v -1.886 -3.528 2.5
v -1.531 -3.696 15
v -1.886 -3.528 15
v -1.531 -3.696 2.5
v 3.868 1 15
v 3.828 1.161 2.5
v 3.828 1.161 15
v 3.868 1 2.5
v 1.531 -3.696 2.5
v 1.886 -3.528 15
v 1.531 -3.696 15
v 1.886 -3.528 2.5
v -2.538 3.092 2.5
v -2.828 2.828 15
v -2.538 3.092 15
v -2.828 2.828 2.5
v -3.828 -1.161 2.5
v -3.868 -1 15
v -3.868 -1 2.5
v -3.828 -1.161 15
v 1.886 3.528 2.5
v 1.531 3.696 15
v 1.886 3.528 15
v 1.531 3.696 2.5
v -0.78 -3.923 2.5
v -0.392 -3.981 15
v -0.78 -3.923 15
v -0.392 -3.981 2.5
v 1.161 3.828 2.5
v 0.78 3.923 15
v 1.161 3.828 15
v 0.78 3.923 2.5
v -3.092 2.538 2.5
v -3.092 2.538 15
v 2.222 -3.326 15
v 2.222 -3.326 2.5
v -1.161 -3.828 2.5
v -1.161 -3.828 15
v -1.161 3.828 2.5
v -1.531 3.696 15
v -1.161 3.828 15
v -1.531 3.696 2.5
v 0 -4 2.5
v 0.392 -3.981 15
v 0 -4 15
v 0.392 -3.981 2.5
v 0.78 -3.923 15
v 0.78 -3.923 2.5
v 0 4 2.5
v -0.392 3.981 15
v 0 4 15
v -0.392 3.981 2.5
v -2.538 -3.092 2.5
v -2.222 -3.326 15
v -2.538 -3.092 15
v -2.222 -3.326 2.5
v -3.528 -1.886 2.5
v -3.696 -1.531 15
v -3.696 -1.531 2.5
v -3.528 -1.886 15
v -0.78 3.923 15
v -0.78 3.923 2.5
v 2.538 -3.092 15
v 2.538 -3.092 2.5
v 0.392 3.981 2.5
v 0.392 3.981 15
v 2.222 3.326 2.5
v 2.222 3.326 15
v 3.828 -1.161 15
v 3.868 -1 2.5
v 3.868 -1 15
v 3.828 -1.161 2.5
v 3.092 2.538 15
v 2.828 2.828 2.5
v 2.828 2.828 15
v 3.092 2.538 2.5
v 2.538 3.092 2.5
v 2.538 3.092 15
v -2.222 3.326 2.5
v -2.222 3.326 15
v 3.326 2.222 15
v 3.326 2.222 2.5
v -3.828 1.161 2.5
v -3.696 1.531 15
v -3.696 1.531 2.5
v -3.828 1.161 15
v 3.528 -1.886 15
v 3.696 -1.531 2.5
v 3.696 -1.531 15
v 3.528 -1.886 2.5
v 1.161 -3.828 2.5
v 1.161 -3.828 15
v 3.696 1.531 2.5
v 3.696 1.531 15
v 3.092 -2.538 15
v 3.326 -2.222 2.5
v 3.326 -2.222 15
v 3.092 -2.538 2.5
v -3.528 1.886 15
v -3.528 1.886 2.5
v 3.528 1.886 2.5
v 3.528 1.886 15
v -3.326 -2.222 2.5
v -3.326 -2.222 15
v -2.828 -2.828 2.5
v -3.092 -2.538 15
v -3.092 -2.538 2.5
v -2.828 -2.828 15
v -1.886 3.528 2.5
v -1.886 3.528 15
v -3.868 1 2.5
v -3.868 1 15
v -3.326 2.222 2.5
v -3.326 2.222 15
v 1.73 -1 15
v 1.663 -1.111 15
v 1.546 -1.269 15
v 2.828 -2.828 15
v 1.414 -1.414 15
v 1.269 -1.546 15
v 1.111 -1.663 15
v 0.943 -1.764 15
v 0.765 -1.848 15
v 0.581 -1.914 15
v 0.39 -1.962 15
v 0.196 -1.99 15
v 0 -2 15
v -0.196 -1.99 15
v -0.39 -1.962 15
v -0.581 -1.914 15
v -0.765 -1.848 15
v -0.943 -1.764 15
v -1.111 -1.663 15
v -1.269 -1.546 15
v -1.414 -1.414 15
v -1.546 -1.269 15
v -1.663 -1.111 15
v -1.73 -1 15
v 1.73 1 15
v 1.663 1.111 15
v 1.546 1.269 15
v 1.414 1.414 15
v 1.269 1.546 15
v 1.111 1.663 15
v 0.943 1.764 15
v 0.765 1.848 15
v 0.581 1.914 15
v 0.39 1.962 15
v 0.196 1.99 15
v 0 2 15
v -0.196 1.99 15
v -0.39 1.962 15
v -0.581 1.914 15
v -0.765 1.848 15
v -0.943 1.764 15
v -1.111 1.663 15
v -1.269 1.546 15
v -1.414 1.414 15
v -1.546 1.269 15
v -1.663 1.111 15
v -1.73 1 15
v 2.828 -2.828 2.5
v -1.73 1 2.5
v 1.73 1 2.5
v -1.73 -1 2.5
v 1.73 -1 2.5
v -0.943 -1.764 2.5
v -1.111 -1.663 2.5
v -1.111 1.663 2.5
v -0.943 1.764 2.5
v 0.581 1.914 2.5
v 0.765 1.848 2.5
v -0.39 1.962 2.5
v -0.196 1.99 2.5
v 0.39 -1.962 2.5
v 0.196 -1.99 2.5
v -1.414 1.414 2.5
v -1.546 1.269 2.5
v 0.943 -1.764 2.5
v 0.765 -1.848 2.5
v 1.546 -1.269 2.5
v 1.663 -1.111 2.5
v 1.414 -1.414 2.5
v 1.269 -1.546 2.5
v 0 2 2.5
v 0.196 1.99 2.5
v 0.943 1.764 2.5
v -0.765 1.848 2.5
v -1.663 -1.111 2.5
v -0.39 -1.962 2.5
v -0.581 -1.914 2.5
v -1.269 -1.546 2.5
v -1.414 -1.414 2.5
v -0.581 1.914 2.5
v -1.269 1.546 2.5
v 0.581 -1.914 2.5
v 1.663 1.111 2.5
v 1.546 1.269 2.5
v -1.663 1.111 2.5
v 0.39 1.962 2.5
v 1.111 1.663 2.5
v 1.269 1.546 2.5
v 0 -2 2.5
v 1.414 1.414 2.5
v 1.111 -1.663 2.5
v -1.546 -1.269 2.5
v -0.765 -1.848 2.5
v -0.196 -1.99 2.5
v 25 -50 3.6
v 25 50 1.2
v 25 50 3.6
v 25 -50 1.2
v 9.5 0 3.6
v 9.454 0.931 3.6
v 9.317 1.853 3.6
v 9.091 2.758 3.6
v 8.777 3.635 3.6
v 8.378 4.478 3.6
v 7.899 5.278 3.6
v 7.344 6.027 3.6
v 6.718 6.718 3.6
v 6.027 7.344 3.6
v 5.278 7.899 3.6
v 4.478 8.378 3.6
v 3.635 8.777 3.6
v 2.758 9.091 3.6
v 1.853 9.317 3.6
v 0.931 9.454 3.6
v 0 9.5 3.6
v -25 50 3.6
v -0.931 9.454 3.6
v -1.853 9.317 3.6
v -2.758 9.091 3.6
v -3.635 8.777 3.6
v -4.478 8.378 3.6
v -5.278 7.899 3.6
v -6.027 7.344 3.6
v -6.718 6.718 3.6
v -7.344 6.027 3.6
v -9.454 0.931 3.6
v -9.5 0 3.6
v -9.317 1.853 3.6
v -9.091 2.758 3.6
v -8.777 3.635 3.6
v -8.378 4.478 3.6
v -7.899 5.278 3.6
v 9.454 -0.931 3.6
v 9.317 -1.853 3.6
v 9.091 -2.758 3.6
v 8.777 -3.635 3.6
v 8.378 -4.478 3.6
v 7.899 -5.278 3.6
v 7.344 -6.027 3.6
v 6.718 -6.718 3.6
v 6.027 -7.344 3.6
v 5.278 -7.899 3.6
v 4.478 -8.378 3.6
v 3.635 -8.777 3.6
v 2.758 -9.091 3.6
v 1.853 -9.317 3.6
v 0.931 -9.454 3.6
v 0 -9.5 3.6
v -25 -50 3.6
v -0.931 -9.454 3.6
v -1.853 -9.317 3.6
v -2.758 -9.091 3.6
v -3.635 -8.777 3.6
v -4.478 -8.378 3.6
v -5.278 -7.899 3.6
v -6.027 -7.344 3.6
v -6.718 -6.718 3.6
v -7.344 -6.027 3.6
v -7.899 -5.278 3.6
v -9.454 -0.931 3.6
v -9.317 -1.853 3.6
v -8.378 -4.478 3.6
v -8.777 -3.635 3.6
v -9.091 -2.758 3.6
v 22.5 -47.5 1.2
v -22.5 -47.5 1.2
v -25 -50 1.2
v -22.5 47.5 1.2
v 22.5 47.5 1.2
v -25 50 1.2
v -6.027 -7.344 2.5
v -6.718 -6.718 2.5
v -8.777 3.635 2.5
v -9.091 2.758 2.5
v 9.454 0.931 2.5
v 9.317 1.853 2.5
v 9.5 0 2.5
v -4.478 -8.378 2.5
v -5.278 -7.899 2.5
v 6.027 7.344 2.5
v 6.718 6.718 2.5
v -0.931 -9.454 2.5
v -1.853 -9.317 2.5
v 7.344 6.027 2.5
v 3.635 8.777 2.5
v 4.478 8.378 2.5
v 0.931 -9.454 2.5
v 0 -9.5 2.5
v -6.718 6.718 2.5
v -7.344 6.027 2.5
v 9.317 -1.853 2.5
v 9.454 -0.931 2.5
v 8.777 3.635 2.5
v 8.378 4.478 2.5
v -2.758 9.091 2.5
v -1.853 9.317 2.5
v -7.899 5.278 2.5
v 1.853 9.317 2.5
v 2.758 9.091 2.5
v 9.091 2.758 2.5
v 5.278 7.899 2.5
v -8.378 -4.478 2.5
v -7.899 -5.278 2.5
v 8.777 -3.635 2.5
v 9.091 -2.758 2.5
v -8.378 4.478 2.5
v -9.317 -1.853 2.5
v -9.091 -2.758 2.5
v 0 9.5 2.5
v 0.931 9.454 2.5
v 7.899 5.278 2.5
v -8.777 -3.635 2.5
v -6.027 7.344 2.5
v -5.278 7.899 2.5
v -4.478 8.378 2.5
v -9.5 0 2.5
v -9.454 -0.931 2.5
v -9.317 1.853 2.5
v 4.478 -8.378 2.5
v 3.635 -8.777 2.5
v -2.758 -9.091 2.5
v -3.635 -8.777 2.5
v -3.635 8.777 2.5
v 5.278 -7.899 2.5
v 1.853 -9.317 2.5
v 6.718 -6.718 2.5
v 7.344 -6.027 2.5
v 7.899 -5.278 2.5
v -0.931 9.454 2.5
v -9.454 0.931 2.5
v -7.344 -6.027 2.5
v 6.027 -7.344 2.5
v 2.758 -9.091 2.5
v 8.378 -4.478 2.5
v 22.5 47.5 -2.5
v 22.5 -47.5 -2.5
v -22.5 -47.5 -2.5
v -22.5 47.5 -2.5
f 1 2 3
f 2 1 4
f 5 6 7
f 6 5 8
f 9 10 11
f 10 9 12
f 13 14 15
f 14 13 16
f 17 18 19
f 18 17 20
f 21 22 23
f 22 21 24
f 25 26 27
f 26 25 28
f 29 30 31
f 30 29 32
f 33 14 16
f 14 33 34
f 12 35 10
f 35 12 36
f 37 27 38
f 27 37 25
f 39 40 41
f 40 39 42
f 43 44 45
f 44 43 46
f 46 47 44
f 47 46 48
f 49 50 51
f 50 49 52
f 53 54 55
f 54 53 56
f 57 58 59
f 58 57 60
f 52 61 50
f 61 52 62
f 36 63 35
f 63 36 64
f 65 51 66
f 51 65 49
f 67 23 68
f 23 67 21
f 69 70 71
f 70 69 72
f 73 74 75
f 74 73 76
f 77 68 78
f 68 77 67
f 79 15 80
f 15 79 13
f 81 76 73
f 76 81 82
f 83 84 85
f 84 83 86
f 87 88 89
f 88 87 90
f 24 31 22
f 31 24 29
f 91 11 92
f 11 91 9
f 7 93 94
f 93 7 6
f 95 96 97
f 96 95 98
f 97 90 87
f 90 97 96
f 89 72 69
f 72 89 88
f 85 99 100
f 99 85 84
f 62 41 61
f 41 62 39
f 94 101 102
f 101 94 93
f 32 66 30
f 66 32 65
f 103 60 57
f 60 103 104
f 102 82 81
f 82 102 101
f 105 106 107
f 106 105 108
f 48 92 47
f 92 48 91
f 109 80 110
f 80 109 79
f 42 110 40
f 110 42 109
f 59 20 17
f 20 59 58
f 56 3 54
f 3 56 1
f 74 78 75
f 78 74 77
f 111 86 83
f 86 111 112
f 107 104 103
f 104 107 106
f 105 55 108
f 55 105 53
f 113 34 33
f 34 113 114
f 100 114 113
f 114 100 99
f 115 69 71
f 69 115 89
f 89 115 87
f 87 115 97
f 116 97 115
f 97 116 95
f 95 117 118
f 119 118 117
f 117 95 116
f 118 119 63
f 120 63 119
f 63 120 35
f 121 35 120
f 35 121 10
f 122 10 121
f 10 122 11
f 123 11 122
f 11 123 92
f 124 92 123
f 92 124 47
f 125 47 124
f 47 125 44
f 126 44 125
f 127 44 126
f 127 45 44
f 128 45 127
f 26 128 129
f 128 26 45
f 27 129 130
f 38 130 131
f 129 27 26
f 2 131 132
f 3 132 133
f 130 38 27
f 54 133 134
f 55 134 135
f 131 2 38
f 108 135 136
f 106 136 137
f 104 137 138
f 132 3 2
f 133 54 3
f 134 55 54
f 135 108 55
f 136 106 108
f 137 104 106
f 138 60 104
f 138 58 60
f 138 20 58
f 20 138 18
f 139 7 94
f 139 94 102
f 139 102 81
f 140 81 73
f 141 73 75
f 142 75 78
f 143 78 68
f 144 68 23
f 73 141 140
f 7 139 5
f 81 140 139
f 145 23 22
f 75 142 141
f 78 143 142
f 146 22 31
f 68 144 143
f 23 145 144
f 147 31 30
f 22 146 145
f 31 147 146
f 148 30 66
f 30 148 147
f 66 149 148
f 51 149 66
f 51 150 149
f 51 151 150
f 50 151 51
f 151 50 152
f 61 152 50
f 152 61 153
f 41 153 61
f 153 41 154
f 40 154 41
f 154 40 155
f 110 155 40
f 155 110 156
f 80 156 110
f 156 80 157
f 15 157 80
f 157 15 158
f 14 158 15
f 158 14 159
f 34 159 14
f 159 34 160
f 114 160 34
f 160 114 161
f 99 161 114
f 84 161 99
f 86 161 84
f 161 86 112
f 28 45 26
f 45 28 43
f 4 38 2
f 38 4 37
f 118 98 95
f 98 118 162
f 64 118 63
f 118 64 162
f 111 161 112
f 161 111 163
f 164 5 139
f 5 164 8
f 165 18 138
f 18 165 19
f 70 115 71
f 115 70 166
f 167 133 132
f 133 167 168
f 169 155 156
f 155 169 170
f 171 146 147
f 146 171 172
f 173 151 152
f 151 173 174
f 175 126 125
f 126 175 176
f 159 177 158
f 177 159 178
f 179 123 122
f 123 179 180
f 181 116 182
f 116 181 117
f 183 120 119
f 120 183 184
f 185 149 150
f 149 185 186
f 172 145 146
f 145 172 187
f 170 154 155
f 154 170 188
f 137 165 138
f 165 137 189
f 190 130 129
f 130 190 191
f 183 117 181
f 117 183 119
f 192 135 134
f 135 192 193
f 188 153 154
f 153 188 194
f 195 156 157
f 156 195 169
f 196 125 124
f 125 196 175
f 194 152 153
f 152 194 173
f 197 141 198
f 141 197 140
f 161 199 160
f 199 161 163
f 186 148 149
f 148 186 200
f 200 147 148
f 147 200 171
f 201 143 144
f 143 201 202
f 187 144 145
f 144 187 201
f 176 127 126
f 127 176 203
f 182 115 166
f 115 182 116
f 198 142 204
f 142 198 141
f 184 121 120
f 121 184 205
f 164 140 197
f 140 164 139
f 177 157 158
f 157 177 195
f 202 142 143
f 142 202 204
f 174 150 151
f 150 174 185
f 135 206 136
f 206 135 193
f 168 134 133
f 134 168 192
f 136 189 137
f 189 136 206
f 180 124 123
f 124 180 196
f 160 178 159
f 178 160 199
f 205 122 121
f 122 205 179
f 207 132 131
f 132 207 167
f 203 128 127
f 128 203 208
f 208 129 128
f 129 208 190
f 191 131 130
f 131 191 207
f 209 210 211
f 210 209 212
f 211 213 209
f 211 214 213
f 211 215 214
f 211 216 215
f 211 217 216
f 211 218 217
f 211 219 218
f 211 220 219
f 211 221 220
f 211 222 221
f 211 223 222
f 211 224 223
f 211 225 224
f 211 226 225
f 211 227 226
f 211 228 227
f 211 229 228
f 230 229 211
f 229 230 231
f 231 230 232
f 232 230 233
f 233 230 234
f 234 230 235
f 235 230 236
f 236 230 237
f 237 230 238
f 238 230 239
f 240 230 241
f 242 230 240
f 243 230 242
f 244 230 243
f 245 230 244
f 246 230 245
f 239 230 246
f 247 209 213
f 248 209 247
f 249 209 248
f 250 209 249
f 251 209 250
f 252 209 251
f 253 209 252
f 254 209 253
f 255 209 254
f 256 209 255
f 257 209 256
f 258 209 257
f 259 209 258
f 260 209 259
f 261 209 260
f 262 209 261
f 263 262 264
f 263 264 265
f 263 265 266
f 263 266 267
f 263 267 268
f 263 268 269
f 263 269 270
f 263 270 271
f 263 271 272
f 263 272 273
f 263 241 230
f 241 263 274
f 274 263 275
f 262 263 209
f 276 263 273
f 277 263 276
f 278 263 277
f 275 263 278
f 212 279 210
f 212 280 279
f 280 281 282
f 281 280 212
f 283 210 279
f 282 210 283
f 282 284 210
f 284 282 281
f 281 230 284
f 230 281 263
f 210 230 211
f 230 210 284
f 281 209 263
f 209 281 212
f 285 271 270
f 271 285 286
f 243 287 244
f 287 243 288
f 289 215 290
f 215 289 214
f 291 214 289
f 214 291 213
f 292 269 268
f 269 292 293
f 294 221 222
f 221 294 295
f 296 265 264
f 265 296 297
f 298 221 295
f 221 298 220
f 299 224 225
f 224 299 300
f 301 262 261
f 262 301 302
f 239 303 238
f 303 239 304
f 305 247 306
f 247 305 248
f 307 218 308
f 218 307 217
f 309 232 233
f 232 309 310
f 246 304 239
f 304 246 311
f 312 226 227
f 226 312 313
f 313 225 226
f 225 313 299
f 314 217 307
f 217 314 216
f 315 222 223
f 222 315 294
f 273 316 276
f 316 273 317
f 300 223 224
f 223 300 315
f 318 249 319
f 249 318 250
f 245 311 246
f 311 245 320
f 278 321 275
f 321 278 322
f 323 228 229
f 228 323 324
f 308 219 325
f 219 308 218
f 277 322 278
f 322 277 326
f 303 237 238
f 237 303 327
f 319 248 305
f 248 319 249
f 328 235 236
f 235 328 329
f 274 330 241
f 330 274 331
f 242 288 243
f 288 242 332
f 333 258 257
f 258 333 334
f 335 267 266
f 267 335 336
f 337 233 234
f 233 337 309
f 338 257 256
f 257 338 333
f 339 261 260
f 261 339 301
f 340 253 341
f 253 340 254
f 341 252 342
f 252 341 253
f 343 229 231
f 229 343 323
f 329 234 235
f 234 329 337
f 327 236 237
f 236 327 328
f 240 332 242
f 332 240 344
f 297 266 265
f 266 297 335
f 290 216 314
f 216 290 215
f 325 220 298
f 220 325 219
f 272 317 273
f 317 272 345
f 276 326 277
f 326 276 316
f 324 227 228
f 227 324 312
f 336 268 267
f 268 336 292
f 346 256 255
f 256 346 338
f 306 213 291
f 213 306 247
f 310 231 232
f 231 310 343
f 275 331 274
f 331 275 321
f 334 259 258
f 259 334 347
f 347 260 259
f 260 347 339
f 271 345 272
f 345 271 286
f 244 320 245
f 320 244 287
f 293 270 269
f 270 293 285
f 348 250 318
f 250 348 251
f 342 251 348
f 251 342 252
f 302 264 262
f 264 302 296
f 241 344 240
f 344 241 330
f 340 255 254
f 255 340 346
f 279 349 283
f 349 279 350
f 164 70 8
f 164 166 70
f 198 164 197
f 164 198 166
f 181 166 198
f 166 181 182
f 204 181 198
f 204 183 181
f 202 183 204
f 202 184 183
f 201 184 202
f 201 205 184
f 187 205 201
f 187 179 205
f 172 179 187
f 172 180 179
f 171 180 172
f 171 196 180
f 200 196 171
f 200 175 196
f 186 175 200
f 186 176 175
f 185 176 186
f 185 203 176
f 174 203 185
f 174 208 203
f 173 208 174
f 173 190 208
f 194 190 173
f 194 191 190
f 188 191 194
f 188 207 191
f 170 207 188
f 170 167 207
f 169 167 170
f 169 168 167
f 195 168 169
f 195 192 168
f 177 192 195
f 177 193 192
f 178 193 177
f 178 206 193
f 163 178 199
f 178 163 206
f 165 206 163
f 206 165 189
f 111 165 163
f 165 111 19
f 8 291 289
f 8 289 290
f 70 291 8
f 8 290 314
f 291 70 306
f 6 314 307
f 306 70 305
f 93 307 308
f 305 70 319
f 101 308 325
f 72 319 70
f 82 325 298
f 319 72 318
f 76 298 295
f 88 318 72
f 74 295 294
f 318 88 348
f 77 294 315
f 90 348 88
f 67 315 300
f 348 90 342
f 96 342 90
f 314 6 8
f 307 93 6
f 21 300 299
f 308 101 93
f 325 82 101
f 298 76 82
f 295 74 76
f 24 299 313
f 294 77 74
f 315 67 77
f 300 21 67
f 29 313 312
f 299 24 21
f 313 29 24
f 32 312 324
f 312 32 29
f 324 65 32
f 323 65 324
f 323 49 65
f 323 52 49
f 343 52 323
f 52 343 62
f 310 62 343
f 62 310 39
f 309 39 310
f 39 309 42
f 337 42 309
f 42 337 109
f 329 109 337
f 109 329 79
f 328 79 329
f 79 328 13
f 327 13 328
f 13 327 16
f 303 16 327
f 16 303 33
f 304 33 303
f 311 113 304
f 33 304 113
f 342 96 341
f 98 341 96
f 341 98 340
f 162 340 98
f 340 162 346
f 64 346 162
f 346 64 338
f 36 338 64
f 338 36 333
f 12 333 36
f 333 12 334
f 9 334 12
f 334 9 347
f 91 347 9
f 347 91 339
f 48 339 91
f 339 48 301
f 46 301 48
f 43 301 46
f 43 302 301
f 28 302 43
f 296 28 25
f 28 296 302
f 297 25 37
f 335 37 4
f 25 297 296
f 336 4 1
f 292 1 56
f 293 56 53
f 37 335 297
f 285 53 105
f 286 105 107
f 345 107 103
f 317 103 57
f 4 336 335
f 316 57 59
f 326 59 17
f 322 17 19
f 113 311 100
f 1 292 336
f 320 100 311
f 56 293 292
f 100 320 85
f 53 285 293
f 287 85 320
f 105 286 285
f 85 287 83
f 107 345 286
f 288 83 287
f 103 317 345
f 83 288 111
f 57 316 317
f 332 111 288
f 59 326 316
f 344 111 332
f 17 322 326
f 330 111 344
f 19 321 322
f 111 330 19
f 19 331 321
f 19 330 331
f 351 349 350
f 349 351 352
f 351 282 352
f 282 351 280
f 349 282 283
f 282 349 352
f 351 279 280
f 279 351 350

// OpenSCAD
 
buggy_width=50;
buggy_length=100;
buggy_height=40;
wall_width=10;
square_height = 5;
lid_height = 2.4;
tut_height = 15;
tut_radius = 4;
$fn = 64;

module bogie_lid() {
  difference() {
    difference() {
      cylinder(h=tut_height, r1= tut_radius, r2=tut_radius);
      cube(size=[20,2,32], center=true);
 }
  cylinder(h=tut_height+1, r1=tut_radius-2, r2=tut_radius-2);
 }
 cube(size=[buggy_width-wall_width+5, buggy_length-wall_width+5, square_height], center=true);
 difference(){
  translate([0,0,lid_height]){ 
     cube(size=[buggy_width, buggy_length, lid_height], center=true);
  }
  translate([0,0,2.4])
   cylinder(h=2, r1=9.5, r2=9.5);
  }
  
}

bogie_lid();

//9 højden 19 bredte 8 hullet
